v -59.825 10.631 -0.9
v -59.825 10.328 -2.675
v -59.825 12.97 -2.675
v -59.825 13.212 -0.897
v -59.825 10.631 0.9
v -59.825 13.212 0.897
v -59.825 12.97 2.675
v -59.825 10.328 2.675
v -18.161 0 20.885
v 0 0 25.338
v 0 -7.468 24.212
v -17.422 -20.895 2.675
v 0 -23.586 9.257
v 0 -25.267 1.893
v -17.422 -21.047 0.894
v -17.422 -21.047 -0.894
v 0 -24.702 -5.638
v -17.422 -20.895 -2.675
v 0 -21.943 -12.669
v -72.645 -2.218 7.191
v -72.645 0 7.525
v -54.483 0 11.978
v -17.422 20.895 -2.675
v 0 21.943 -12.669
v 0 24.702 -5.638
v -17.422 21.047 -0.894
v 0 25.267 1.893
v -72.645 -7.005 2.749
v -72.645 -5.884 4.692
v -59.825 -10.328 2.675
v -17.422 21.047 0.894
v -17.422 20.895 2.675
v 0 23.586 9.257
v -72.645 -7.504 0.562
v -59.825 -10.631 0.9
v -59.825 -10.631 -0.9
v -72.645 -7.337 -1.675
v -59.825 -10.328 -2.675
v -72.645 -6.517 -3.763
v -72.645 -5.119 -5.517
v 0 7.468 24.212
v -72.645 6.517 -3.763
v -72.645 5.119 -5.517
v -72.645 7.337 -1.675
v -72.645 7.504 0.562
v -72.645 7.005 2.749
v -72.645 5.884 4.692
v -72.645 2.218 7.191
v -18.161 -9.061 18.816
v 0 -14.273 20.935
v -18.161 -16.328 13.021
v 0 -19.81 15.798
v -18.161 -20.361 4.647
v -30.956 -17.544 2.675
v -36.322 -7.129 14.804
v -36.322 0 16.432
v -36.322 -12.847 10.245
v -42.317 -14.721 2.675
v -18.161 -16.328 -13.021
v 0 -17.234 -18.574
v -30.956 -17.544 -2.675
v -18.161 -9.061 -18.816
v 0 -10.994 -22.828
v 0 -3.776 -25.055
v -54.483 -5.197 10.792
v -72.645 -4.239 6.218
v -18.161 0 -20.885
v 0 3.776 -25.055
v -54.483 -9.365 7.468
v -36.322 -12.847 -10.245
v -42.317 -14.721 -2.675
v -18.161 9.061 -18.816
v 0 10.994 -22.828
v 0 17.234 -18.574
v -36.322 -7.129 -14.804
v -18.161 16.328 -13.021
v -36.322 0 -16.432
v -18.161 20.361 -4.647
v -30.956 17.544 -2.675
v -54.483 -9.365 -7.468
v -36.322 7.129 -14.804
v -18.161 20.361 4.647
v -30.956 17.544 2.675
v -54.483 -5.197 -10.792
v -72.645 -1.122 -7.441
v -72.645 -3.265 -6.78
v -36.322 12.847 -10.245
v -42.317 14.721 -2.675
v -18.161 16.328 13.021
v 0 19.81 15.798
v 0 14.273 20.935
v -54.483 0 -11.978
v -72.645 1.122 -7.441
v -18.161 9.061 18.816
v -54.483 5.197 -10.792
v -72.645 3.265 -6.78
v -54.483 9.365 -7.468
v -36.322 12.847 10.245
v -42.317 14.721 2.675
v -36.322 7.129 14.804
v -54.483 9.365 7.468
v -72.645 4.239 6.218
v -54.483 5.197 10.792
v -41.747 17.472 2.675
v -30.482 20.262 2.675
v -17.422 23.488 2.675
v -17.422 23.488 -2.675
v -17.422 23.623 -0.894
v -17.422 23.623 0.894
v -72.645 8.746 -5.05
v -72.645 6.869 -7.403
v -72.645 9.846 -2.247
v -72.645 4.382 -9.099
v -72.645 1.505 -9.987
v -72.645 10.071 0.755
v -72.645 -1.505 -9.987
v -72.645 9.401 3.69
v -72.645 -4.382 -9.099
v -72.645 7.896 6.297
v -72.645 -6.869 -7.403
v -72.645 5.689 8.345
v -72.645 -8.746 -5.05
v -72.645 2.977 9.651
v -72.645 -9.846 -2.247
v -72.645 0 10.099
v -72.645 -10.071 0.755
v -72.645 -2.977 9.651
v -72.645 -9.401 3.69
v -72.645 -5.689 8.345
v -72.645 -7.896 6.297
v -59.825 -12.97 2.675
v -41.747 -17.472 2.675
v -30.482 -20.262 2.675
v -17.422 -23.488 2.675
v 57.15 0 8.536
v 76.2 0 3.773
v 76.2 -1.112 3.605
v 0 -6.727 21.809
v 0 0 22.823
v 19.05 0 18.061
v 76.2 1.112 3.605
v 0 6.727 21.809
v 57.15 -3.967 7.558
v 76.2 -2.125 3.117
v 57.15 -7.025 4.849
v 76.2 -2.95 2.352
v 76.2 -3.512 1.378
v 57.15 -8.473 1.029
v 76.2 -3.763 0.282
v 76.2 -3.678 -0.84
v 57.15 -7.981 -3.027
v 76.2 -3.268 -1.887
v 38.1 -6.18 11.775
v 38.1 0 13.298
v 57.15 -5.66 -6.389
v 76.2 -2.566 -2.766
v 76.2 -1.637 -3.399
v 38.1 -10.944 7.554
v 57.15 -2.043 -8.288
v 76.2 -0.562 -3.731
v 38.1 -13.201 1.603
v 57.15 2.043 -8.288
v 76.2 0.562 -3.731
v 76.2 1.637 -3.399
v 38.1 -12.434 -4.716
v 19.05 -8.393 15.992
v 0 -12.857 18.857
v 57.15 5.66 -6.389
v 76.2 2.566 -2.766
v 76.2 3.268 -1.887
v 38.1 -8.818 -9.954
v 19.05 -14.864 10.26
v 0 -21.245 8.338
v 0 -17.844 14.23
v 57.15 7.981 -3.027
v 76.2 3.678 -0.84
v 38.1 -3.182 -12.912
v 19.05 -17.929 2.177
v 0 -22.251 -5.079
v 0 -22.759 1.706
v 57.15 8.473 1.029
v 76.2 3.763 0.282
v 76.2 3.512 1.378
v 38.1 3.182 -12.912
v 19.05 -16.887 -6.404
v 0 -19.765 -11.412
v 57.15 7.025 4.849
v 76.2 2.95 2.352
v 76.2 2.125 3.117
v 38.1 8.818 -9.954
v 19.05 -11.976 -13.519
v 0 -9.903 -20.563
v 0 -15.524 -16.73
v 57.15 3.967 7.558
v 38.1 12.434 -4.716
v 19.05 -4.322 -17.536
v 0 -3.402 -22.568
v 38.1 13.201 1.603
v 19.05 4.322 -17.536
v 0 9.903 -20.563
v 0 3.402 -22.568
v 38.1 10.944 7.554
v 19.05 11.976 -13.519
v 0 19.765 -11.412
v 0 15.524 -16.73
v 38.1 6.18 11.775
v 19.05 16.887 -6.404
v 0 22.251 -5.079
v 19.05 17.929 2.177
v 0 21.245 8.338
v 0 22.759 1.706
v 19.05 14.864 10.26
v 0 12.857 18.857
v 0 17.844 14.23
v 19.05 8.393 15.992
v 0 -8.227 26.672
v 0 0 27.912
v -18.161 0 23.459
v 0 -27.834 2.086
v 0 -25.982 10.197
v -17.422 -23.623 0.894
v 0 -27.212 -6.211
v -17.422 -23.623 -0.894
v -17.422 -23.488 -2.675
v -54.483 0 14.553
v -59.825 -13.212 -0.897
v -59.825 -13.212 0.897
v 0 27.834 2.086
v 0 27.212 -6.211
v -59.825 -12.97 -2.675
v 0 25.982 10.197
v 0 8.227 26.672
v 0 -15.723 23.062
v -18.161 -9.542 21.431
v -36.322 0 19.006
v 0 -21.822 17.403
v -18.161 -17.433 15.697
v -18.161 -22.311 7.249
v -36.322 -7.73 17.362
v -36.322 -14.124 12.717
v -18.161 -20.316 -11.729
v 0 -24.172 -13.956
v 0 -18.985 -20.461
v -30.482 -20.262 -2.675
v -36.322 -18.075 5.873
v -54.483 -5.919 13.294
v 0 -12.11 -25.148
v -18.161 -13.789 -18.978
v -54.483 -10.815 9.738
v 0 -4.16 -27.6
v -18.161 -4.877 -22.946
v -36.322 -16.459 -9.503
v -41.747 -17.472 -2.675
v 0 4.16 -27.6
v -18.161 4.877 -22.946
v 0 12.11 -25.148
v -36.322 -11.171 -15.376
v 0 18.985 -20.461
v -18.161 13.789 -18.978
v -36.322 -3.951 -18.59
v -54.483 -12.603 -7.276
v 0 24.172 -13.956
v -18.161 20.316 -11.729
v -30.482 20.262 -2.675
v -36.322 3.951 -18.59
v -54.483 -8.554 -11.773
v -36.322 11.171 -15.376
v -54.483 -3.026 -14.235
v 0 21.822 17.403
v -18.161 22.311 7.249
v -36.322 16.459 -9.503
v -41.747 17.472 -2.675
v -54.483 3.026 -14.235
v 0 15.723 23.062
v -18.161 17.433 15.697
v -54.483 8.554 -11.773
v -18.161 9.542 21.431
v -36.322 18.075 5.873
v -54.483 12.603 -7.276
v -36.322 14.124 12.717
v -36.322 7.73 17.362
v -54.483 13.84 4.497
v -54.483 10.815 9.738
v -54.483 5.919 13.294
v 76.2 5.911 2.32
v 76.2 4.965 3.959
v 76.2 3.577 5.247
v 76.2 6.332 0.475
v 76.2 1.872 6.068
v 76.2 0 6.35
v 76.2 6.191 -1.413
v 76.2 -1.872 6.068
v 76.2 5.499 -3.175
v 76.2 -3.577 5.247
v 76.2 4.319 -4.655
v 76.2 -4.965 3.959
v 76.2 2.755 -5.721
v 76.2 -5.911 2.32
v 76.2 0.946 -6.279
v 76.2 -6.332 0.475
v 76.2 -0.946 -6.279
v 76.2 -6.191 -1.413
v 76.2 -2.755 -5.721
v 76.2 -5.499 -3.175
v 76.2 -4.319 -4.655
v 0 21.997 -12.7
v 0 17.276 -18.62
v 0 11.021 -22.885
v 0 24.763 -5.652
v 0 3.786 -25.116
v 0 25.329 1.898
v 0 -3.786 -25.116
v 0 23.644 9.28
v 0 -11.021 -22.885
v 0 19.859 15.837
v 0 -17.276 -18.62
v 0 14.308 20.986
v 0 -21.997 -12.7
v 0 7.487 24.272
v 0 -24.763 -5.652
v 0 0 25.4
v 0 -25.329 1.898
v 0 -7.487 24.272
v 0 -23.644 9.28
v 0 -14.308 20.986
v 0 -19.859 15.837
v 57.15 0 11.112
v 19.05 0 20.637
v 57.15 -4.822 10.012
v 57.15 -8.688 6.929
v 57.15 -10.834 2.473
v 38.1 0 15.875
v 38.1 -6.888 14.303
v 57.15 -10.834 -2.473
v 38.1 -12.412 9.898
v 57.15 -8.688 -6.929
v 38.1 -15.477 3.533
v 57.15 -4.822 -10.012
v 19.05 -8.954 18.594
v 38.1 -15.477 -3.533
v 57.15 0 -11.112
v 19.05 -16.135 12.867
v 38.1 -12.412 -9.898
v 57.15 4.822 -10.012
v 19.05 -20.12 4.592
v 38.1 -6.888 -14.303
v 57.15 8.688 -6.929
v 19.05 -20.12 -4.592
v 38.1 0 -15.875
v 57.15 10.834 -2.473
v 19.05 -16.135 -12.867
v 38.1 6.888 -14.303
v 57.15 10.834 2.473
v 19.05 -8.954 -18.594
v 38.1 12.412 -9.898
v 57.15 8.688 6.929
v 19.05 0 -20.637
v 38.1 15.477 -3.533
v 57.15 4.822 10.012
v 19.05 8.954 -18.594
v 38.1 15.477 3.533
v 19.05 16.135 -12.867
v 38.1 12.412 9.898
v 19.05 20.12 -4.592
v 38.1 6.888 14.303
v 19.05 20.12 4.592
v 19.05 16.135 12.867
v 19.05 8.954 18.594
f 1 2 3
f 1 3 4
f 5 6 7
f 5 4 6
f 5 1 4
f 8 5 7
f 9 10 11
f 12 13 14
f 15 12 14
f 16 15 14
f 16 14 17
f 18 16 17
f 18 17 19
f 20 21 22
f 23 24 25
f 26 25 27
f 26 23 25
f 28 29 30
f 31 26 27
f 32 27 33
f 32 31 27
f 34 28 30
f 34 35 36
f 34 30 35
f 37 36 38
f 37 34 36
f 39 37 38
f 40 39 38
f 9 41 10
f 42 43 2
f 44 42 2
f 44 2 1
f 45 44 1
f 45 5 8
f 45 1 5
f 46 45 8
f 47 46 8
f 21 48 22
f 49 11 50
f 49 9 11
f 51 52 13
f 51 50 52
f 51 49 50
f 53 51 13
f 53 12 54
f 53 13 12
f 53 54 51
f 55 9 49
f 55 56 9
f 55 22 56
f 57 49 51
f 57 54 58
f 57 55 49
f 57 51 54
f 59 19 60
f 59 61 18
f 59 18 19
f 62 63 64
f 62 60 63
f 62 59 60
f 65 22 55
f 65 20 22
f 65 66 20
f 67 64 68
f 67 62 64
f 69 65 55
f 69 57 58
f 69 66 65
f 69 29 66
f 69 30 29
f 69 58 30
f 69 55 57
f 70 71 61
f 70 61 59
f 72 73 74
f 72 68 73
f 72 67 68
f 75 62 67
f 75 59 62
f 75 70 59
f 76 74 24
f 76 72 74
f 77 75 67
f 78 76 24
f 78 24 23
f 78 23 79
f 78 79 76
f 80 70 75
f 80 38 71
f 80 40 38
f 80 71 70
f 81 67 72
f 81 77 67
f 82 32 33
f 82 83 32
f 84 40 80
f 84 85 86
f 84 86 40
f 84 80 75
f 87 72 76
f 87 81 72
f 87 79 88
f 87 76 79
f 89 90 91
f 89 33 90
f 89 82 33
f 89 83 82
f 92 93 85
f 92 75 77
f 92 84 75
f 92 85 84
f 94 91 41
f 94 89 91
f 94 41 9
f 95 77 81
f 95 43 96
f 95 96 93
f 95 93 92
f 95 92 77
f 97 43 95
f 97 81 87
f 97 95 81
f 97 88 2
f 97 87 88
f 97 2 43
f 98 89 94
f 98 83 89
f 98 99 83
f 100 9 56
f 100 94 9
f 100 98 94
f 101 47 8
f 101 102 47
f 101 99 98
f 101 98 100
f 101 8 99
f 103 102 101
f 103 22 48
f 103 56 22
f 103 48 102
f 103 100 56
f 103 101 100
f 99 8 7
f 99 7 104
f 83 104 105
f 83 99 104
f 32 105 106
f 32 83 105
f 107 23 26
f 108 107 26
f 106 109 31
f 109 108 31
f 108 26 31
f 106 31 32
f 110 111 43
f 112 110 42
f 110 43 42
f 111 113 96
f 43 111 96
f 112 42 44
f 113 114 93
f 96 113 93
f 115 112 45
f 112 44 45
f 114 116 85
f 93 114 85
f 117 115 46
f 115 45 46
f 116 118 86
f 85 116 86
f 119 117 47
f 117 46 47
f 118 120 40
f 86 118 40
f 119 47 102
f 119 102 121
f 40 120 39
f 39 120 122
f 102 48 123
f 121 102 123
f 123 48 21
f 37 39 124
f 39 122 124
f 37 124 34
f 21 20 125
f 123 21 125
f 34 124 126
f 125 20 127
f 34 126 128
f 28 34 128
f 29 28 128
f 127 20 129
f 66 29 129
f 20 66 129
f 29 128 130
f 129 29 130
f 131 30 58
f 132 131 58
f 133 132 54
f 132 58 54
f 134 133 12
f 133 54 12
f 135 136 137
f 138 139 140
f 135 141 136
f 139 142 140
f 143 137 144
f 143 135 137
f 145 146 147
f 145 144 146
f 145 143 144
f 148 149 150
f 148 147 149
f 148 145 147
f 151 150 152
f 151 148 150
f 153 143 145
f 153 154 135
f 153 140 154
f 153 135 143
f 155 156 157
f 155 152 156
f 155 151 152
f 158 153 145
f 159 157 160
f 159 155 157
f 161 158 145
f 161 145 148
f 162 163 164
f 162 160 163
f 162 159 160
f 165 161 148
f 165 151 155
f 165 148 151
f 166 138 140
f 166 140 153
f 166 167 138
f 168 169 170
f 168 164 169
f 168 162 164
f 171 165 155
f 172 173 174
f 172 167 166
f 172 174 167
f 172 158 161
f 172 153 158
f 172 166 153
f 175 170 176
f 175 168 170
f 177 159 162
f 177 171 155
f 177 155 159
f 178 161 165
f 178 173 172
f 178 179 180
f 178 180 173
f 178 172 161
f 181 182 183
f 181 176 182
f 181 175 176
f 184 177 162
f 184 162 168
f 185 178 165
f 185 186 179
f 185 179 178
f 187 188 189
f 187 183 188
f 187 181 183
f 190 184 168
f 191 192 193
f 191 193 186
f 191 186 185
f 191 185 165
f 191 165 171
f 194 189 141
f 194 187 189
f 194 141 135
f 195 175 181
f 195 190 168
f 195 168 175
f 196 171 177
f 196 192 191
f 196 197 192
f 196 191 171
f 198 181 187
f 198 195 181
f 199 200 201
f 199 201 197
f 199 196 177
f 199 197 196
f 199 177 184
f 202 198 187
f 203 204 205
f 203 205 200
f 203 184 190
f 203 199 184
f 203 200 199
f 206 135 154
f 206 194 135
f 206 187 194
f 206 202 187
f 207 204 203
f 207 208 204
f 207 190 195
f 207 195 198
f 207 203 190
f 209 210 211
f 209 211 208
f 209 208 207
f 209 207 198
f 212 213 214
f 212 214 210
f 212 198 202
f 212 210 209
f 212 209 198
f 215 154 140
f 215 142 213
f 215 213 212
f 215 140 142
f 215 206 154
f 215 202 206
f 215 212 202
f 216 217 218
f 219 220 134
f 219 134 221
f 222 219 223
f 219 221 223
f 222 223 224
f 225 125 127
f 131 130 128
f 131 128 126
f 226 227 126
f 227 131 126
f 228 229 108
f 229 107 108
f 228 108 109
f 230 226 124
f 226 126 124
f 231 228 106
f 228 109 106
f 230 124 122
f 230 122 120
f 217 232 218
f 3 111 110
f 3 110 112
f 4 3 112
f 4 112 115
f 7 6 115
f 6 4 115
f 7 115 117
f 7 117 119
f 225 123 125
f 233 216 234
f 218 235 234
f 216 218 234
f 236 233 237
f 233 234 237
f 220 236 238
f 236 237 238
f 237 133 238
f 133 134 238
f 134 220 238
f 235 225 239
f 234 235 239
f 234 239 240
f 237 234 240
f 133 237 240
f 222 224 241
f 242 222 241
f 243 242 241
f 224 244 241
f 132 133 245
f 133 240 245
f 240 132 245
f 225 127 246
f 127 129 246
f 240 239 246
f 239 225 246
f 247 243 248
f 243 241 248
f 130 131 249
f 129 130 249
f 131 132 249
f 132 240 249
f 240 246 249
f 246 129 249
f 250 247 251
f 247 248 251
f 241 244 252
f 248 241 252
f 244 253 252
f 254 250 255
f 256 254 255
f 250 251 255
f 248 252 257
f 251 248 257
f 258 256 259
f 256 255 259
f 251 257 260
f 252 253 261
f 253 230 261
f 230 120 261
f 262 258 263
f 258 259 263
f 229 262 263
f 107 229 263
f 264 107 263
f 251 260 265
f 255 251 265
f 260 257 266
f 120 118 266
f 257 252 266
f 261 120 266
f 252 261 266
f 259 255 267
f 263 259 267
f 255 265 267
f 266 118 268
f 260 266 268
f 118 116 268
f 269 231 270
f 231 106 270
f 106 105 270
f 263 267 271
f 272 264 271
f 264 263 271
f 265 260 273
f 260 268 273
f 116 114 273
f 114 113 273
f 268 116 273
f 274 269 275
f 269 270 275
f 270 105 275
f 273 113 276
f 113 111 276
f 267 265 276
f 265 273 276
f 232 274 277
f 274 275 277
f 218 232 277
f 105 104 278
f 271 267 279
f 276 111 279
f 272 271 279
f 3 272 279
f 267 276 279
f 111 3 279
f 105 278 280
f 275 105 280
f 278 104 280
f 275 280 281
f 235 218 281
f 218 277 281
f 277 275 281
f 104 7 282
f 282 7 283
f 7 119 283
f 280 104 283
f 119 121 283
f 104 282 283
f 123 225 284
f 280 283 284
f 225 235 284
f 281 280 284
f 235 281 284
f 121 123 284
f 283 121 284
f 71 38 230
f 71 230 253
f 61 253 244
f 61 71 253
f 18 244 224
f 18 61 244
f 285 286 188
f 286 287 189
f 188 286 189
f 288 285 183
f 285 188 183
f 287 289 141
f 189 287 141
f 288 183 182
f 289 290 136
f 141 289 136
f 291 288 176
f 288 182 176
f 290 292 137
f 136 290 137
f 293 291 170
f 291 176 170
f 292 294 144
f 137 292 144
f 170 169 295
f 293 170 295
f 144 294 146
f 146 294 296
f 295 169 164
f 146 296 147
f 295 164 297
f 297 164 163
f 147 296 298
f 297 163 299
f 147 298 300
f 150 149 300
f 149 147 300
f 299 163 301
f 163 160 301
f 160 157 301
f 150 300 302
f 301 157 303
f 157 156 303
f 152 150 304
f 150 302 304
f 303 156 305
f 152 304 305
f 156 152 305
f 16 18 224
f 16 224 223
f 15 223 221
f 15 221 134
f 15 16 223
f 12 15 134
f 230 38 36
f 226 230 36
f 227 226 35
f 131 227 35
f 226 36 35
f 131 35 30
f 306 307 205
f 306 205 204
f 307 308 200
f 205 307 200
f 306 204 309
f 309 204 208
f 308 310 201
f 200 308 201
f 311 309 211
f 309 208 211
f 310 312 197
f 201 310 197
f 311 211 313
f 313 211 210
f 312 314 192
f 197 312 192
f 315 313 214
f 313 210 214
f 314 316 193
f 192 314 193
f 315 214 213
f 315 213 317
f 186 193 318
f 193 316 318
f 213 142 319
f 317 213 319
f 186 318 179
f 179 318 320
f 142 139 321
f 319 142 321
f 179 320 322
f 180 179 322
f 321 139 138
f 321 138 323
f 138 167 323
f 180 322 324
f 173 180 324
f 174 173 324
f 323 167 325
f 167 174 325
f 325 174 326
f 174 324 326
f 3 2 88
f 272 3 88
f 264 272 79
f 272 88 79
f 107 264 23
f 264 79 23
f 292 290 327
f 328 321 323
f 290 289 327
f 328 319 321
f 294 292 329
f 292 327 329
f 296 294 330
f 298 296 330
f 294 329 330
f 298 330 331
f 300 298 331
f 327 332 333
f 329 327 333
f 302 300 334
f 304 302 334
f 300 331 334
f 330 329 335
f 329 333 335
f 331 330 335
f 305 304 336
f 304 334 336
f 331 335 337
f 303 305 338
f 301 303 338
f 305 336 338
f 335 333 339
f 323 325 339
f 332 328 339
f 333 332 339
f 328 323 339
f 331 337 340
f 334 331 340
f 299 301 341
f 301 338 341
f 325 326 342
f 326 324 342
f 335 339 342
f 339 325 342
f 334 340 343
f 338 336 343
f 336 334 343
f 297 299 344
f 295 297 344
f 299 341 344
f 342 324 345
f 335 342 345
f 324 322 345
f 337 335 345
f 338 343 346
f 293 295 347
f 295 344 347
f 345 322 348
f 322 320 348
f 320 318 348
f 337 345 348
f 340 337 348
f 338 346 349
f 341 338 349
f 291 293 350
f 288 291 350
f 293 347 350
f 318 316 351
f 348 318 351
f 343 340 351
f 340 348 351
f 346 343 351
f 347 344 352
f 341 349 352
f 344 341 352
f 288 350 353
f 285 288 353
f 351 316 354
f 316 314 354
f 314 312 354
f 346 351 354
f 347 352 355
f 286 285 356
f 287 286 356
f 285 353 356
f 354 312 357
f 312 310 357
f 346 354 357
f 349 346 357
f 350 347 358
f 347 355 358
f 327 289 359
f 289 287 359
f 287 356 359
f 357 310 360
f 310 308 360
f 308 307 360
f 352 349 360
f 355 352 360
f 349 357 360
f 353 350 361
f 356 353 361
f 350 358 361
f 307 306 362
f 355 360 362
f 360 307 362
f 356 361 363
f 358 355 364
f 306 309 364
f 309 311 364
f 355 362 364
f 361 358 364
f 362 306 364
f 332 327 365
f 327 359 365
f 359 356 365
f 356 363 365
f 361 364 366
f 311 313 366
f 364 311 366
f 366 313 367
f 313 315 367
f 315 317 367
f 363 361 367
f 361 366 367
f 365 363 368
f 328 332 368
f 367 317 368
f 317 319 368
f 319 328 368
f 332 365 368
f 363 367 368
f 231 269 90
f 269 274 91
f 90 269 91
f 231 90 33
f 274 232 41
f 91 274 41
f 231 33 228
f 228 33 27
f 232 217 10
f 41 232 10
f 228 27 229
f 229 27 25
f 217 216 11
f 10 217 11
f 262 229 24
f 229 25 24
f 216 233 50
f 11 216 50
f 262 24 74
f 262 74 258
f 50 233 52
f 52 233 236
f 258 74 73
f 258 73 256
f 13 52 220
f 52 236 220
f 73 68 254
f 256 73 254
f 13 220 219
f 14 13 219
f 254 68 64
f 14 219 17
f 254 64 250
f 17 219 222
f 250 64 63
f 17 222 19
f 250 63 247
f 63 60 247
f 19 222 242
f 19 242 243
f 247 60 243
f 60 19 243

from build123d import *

# Parameters (mm, degrees)
F2_T          = -2.5
F5_T          = -2.5
F6_W          = 42.4038469791
F6_H          = 5.3509618156
F7_DEPTH      = 25
F7_DEPTH_BACK = 25


with BuildPart() as f1:
    # F0 (on Front) → F1 (revolve)
    with BuildSketch(Plane.XZ):
        Polygon((0, 0), (76.2, 0), (76.2, 6.35), (0, 25.4), align=None)
    revolve(axis=Axis((38.1, 0, 0), (1, 0, 0)))

    # F2
    f2_openings = [f1.faces().sort_by_distance(p)[0] for p in [
        (0, 0, 0),
        (76.2, 0, 0),
    ]]
    offset(amount=F2_T, openings=f2_openings)


with BuildPart() as f4:
    # F3 (on Front) → F4 (revolve)
    with BuildSketch(Plane.XZ):
        Polygon((0, 0), (0, 27.9117356986), (-72.6445764303, 10.0994696841), (-72.6445764303, 0), align=None)
    revolve(axis=Axis((-36.3222882152, 0, 0), (1, 0, 0)))

    # F5
    f5_openings = [f4.faces().sort_by_distance(p)[0] for p in [
        (-72.644576, 0, 0),
        (0, 0, 0),
    ]]
    offset(amount=F5_T, openings=f5_openings)

    # F6 (on Front) → F7 (cut, two sides)
    with BuildSketch(Plane.XZ) as f7_sk:
        with Locations((-38.62356022, 0)):
            Rectangle(F6_W, F6_H)
    extrude(amount=-F7_DEPTH, mode=Mode.SUBTRACT)
    extrude(f7_sk.sketch, amount=F7_DEPTH_BACK, mode=Mode.SUBTRACT)


solid = Compound([f1.part, f4.part])
